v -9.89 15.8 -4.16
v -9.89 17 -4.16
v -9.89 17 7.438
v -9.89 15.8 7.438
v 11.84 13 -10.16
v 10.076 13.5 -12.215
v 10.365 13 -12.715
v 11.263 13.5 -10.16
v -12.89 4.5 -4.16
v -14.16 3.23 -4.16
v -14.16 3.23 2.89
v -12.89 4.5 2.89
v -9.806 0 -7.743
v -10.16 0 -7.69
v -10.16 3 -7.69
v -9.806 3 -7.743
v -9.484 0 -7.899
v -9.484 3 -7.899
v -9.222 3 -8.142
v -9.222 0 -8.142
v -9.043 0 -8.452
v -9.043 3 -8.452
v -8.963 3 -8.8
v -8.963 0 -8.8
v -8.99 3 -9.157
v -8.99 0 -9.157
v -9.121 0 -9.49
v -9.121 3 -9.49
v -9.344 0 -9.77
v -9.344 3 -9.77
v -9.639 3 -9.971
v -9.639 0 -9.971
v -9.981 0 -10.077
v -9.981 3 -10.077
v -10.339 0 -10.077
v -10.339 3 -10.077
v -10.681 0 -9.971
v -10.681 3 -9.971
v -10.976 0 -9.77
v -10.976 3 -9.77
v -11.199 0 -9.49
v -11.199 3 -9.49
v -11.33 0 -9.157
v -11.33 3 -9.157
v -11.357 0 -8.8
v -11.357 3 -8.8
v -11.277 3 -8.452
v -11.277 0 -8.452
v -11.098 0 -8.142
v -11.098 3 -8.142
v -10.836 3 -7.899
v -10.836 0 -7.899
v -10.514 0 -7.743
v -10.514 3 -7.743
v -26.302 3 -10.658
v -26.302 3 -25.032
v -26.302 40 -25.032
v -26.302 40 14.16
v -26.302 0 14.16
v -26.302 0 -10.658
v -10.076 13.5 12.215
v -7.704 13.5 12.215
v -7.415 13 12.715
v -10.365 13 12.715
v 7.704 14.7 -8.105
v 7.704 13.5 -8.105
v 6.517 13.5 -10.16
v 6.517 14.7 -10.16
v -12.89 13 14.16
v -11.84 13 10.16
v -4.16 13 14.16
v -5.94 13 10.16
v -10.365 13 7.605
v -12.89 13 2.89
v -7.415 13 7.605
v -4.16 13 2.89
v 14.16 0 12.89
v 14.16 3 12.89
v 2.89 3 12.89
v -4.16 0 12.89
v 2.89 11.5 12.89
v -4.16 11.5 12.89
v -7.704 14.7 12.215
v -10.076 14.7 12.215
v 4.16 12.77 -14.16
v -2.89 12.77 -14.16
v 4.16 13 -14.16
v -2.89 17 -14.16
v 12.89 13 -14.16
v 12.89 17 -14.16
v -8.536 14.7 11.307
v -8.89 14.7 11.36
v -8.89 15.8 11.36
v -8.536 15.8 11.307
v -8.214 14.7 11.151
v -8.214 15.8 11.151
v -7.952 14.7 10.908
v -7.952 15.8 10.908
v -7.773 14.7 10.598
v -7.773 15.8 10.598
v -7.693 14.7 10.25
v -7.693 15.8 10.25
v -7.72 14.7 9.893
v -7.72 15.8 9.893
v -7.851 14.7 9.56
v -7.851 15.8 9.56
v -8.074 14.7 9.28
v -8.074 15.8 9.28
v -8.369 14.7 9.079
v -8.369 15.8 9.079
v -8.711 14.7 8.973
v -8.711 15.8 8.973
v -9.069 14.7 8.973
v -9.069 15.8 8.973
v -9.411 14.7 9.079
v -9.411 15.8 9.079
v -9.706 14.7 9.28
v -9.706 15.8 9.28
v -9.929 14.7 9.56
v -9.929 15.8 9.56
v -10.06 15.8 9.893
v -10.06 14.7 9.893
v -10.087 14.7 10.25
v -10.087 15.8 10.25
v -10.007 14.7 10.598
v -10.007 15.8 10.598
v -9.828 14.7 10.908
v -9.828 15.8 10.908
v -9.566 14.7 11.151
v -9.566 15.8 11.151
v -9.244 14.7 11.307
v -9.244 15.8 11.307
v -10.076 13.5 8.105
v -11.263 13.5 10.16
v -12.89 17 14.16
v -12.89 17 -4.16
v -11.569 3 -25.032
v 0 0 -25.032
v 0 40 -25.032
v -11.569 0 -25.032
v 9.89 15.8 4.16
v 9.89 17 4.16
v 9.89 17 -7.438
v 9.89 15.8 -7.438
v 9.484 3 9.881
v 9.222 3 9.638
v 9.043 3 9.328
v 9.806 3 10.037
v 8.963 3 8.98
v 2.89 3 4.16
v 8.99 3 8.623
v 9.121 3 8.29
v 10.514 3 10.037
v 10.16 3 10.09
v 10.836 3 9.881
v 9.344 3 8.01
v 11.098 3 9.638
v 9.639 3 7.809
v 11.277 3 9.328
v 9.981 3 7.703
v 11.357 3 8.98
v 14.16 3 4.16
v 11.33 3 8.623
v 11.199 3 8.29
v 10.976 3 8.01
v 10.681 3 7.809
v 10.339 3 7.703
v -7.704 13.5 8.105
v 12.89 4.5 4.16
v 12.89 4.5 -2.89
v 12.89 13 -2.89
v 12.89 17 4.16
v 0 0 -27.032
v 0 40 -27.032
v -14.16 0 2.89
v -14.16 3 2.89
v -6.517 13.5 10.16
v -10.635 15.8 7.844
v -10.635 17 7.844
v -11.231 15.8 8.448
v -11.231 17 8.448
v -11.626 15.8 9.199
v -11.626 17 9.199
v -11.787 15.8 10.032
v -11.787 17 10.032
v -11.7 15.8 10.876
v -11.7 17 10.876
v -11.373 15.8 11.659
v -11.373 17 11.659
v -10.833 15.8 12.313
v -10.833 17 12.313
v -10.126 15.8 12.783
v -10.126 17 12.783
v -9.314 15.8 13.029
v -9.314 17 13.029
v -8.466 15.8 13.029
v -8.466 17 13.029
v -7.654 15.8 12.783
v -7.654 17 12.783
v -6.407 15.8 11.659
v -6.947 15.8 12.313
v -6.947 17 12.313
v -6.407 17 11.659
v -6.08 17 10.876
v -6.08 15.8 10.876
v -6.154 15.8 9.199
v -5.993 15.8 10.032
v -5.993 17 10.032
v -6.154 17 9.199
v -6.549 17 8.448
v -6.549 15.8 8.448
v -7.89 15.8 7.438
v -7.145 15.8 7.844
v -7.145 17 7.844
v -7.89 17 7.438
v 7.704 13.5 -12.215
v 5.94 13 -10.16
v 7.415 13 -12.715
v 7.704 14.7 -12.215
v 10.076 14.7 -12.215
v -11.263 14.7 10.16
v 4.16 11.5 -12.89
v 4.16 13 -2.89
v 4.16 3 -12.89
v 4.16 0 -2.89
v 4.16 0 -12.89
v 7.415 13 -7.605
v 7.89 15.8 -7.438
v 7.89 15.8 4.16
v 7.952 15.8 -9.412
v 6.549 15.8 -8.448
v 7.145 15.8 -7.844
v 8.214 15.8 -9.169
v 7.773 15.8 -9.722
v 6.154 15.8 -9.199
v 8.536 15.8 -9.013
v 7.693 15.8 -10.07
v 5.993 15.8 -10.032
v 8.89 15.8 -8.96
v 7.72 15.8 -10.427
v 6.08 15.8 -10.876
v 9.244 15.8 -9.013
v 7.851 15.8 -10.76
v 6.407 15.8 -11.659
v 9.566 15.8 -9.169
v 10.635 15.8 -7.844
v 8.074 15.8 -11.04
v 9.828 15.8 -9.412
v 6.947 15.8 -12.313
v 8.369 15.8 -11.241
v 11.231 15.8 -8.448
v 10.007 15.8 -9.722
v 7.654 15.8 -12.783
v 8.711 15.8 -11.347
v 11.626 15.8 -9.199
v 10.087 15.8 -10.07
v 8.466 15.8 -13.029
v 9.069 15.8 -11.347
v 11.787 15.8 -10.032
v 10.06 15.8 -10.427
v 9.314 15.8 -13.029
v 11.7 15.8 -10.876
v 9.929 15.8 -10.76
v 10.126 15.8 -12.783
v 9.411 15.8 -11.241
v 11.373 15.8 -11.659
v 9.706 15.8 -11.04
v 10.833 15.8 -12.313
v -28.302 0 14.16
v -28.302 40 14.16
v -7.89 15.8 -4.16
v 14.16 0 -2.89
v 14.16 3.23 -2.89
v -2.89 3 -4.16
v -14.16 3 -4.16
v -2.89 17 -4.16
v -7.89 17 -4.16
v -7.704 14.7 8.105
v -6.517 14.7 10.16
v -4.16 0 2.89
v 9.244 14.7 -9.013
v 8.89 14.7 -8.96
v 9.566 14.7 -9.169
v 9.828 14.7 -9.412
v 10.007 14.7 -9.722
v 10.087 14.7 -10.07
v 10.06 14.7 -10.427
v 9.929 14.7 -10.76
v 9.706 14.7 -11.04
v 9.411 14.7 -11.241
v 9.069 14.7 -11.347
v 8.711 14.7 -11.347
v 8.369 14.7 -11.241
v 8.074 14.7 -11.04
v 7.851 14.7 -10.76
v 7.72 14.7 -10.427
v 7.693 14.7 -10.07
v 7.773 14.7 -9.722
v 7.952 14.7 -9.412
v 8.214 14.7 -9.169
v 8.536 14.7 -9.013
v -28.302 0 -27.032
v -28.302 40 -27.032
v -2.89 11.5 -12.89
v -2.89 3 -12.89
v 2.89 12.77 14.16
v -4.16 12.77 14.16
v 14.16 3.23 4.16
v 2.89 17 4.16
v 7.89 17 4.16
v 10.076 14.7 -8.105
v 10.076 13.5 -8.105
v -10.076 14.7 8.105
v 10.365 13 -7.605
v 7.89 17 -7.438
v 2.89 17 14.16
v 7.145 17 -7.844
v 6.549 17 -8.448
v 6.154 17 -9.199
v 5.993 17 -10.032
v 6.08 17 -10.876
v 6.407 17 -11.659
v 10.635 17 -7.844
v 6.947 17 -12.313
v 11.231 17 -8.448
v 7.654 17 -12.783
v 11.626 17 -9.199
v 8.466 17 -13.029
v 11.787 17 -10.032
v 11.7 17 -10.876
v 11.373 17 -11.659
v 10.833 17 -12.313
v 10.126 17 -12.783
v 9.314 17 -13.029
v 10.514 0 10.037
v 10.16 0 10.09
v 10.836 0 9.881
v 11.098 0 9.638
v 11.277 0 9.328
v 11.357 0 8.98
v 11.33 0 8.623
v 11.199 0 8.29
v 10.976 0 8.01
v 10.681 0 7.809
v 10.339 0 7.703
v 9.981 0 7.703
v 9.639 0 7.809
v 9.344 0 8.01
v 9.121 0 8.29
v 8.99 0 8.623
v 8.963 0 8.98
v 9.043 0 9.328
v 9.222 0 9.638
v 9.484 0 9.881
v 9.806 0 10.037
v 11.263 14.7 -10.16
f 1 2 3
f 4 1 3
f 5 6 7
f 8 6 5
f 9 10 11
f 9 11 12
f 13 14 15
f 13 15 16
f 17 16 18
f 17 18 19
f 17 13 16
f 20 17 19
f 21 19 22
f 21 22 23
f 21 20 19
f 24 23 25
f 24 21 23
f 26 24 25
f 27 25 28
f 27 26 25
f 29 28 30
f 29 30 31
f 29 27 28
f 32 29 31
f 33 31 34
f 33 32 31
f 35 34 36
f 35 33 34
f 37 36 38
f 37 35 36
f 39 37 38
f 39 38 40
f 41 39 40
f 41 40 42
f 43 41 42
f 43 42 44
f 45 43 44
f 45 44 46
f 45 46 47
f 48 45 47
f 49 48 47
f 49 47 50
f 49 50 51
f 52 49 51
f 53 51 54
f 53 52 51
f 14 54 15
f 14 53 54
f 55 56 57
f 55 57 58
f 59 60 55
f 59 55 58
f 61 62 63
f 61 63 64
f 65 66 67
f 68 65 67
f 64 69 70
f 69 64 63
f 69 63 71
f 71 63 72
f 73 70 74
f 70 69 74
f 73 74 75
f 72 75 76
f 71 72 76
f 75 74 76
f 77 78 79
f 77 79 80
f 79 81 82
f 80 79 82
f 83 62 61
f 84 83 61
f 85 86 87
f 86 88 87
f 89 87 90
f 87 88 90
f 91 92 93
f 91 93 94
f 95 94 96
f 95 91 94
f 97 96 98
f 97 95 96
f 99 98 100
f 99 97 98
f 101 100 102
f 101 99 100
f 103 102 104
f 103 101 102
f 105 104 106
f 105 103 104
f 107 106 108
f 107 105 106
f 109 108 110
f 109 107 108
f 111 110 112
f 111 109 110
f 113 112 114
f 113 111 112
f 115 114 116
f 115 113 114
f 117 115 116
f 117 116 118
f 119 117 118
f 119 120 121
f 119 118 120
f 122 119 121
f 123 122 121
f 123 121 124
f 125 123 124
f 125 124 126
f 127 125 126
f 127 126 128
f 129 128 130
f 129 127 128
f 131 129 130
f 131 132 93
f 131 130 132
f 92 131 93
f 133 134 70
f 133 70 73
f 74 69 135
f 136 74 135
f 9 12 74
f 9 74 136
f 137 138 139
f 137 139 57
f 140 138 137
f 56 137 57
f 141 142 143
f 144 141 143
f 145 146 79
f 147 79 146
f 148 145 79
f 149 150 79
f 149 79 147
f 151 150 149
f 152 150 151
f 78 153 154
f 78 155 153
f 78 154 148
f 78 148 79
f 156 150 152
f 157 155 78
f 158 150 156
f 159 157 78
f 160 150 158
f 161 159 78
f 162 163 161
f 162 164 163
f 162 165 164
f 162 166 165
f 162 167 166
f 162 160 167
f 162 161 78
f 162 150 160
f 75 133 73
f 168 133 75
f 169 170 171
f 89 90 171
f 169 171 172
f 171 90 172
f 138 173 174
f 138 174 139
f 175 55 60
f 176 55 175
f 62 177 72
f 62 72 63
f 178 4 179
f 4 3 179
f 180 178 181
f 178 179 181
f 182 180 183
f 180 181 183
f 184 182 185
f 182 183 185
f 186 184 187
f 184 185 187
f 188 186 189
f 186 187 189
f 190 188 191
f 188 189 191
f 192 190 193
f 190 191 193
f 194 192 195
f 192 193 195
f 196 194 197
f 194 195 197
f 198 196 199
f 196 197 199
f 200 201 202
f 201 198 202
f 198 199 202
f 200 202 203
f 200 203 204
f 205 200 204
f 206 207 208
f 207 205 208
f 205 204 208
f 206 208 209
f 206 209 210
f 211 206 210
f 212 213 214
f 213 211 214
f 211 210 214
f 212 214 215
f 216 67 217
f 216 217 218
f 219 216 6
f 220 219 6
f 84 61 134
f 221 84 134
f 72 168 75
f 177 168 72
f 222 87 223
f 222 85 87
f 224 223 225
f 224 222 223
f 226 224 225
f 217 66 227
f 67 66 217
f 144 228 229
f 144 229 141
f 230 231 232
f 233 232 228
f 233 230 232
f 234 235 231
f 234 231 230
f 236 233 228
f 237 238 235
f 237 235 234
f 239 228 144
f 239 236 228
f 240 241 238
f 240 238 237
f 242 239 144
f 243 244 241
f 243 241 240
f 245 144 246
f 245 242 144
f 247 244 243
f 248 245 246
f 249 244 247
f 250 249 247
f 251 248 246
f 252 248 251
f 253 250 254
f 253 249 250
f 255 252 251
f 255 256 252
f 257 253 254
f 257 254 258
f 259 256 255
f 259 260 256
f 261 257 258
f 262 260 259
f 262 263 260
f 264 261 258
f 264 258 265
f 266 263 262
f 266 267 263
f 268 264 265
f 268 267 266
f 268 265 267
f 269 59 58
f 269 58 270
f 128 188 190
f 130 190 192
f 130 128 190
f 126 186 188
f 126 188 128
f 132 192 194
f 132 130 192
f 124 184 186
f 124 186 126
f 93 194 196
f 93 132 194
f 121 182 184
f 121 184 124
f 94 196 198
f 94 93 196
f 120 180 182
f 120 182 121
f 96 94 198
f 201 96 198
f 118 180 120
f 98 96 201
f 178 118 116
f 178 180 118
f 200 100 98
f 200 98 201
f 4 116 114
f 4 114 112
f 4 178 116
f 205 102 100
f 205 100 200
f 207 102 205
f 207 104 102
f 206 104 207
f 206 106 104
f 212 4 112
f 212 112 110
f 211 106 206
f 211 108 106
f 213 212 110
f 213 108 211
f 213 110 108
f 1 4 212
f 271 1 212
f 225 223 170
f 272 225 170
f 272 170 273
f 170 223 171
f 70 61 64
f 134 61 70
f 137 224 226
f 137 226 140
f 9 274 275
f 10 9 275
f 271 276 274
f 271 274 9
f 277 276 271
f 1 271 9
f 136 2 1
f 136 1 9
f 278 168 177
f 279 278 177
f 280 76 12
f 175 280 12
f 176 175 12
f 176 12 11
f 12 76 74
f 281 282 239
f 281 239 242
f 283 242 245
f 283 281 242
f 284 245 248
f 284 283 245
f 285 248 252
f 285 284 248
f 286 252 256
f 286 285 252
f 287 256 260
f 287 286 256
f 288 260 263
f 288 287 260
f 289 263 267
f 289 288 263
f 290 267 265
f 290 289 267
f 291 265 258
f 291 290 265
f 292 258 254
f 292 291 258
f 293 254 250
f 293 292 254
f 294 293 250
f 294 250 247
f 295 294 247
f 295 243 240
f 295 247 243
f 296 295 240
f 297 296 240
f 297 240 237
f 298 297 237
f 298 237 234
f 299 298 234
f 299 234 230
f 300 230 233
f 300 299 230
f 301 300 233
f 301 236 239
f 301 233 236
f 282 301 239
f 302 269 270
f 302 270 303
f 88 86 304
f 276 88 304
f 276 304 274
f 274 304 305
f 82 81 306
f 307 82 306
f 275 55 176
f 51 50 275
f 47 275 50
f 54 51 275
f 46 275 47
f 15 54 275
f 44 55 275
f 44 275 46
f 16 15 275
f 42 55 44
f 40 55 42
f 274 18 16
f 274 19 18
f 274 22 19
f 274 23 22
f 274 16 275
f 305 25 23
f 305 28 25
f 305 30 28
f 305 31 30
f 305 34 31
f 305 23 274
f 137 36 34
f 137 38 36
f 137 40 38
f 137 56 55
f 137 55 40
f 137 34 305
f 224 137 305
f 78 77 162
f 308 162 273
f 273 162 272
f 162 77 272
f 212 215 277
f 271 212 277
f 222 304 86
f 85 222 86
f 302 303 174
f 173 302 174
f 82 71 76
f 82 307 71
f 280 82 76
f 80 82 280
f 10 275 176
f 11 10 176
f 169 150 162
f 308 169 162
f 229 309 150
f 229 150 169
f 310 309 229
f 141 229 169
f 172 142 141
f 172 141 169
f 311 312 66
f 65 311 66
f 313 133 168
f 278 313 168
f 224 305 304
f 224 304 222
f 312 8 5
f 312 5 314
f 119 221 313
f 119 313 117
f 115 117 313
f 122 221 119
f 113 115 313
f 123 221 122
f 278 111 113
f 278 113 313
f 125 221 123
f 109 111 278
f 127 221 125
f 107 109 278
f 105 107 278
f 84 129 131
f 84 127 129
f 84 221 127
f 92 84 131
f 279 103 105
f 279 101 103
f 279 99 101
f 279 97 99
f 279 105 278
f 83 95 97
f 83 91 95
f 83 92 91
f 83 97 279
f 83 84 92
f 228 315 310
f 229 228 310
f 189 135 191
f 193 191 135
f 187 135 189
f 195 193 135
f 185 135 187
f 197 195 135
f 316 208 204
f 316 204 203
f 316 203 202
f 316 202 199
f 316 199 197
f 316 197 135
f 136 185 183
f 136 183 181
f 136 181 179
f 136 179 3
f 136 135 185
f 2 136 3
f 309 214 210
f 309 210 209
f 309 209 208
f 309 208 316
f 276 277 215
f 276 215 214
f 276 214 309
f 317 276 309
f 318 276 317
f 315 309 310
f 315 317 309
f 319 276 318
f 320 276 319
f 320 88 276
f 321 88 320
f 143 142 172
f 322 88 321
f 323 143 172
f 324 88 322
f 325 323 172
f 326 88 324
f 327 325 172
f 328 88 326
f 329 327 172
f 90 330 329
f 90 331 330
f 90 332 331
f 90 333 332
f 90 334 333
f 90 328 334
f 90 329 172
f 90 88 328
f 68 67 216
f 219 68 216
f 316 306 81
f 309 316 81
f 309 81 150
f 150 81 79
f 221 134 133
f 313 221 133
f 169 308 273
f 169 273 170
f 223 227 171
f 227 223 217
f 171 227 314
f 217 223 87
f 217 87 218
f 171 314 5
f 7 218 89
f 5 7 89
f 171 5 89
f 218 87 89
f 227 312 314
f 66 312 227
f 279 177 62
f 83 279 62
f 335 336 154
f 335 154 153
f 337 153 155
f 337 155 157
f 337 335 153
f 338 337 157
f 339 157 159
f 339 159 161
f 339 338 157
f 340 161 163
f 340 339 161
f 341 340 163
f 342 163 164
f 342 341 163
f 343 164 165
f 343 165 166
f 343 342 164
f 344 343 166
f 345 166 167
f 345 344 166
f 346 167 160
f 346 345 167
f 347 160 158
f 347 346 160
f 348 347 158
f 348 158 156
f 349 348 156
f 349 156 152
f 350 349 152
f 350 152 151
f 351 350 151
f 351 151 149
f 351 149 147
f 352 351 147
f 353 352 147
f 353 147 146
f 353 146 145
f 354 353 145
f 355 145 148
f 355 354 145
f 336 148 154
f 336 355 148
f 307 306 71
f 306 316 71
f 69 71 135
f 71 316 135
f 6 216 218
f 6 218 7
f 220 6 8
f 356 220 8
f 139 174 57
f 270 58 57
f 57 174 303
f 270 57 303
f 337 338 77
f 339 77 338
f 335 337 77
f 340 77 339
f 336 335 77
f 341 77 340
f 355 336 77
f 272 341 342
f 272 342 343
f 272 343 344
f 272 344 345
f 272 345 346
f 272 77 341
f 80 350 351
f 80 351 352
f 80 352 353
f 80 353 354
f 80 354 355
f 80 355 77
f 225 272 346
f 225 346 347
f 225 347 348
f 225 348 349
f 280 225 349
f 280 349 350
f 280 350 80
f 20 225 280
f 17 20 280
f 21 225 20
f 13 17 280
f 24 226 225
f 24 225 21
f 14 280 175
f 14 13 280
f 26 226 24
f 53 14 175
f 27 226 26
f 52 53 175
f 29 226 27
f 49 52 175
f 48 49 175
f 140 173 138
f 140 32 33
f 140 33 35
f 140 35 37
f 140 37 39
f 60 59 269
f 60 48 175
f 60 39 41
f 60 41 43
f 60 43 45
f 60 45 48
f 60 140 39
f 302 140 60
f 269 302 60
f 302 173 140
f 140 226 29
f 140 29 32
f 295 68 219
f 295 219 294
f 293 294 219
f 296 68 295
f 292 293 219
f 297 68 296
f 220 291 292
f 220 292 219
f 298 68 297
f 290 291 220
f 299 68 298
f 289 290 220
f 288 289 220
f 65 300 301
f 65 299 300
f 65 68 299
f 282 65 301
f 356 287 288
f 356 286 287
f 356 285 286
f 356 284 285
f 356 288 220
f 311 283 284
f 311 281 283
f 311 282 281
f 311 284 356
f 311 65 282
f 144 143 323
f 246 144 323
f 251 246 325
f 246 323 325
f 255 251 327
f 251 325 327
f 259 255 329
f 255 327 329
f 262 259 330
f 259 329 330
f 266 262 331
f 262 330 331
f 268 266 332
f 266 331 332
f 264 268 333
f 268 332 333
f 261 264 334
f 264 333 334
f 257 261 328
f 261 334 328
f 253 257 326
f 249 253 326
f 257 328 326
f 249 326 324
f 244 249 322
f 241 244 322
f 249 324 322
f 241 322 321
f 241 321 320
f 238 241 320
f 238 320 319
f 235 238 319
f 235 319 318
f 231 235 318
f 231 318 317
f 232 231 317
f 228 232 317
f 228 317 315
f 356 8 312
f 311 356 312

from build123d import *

# Parameters (mm, degrees)
SKETCH1_W           = 28.32
SKETCH1_H           = 25.78
SKETCH1_R           = 1.2
BOSS_EXTRUDE1_DEPTH = 3
SKETCH4_W           = 25.78
SKETCH4_H           = 28.32
SKETCH4_R           = 1.2
BOSS_EXTRUDE2_DEPTH = 4
SKETCH5_W           = 10
SKETCH5_H           = 10
CUT_EXTRUDE2_DEPTH  = 4
SKETCH8_W           = 10
SKETCH8_H           = 10
CUT_EXTRUDE3_DEPTH  = 3
BOSS_EXTRUDE3_DEPTH = 10
SKETCH3_R           = 2.9
CUT_EXTRUDE4_DEPTH  = 1.2
CHAMFER1_SIZE       = 1.5
BOSS_EXTRUDE4_DEPTH = 3
EXTRUDE_THIN1_START = -3
EXTRUDE_THIN1_DEPTH = 40
CUT_EXTRUDE5_DEPTH  = 1.7
CHAMFER2_SIZE       = 0.5
CUT_EXTRUDE6_DEPTH  = 1.2


with BuildPart() as part:
    # Sketch1 → Boss-Extrude1 (new body)
    with BuildSketch(Plane(origin=(0, 0, 0), x_dir=(1, 0, 0), z_dir=(0, 1, 0))):
        Rectangle(SKETCH1_W, SKETCH1_H)
        with Locations(Location((-10.16, 8.89, 0), (0, 0, 270))):
            Circle(SKETCH1_R, mode=Mode.SUBTRACT)
        with Locations(Location((10.16, 8.89, 0), (0, 0, 270))):
            Circle(SKETCH1_R, mode=Mode.SUBTRACT)
        with Locations(Location((10.16, -8.89, 0), (0, 0, 270))):
            Circle(SKETCH1_R, mode=Mode.SUBTRACT)
        with Locations(Location((-10.16, -8.89, 0), (0, 0, 270))):
            Circle(SKETCH1_R, mode=Mode.SUBTRACT)
    extrude(amount=BOSS_EXTRUDE1_DEPTH)

    # Sketch8 → Cut-Extrude3 (cut)
    with BuildSketch(Plane.XZ):
        with Locations((-9.16, 7.89)):
            Rectangle(SKETCH8_W, SKETCH8_H)
        with Locations((9.16, -7.89)):
            Rectangle(SKETCH8_W, SKETCH8_H)
    extrude(amount=-CUT_EXTRUDE3_DEPTH, mode=Mode.SUBTRACT)



with BuildPart() as body_2:
    # Sketch4 → Boss-Extrude2 (new body)
    with BuildSketch(Plane(origin=(0, 13, 0), x_dir=(1, 0, 0), z_dir=(0, 1, 0))):
        Rectangle(SKETCH4_W, SKETCH4_H)
        with Locations(Location((-8.89, 10.16, 0), (0, 0, 270))):
            Circle(SKETCH4_R, mode=Mode.SUBTRACT)
        with Locations(Location((8.89, 10.16, 0), (0, 0, 270))):
            Circle(SKETCH4_R, mode=Mode.SUBTRACT)
        with Locations(Location((-8.89, -10.16, 0), (0, 0, 270))):
            Circle(SKETCH4_R, mode=Mode.SUBTRACT)
        with Locations(Location((8.89, -10.16, 0), (0, 0, 270))):
            Circle(SKETCH4_R, mode=Mode.SUBTRACT)
    extrude(amount=BOSS_EXTRUDE2_DEPTH)

    # Sketch5 → Cut-Extrude2 (cut)
    with BuildSketch(Plane(origin=(0, 17, 0), x_dir=(1, 0, 0), z_dir=(0, 1, 0))):
        with Locations((-7.89, 9.16)):
            Rectangle(SKETCH5_W, SKETCH5_H)
        with Locations((7.89, -9.16)):
            Rectangle(SKETCH5_W, SKETCH5_H)
    extrude(amount=-CUT_EXTRUDE2_DEPTH, mode=Mode.SUBTRACT)


with BuildPart() as part_1:
    add(part.part)

    add(body_2.part)  # Boss-Extrude3 merges body 2
    # Sketch9 → Boss-Extrude3 (add)
    with BuildSketch(Plane.XZ.offset(-13)):
        Polygon((2.89, 4.16), (2.89, 12.89), (-4.16, 12.89), (-4.16, 2.89), (-12.89, 2.89), (-12.89, -4.16), (-2.89, -4.16), (-2.89, -12.89), (4.16, -12.89), (4.16, -2.89), (12.89, -2.89), (12.89, 4.16), align=None)
    extrude(amount=BOSS_EXTRUDE3_DEPTH)

    # Sketch3 → Cut-Extrude4 (cut)
    with BuildSketch(Plane(origin=(0, 17, 0), x_dir=(1, 0, 0), z_dir=(0, 1, 0))):
        with Locations(Location((8.89, 10.16, 0), (0, 0, 270))):
            Circle(SKETCH3_R)
        with Locations(Location((-8.89, -10.16, 0), (0, 0, 270))):
            Circle(SKETCH3_R)
    extrude(amount=-CUT_EXTRUDE4_DEPTH, mode=Mode.SUBTRACT)

    # Chamfer1
    # the kernel refuses this chamfer: 1.5 mm, written as the material it adds along each edge
    with BuildSketch(Plane(origin=(-2.89, 13, -12.89), x_dir=(0, -0.9996219169112968, 0.027495876610585616), z_dir=(1, 0, 0))) as chamfer1_piece_1_section:
        Polygon((CHAMFER1_SIZE * 0.999621916911, CHAMFER1_SIZE * 0.0274958766106), (-CHAMFER1_SIZE * 0.0274958766106, CHAMFER1_SIZE * 0.999621916911), (0, 0), align=None)
    chamfer1_piece_1 = extrude(amount=7.05, mode=Mode.PRIVATE)
    chamfer1_piece_1 = split(chamfer1_piece_1, bisect_by=Plane(origin=(0.635, 12.489006397, -14.16), z_dir=(0, 0, 1)), keep=Keep.TOP, mode=Mode.PRIVATE)
    add(chamfer1_piece_1)
    with BuildSketch(Plane(origin=(2.89, 13, 12.89), x_dir=(0, -0.9996219169112965, -0.02749587661058676), z_dir=(-1, 0, 0))) as chamfer1_piece_2_section:
        Polygon((CHAMFER1_SIZE * 0.999621916911, CHAMFER1_SIZE * 0.0274958766106), (-CHAMFER1_SIZE * 0.0274958766106, CHAMFER1_SIZE * 0.999621916911), (0, 0), align=None)
    chamfer1_piece_2 = extrude(amount=7.05, mode=Mode.PRIVATE)
    chamfer1_piece_2 = split(chamfer1_piece_2, bisect_by=Plane(origin=(-0.635, 12.489006397, 14.16), z_dir=(0, 0, -1)), keep=Keep.TOP, mode=Mode.PRIVATE)
    add(chamfer1_piece_2)
    with BuildSketch(Plane(origin=(12.89, 3, -2.89), x_dir=(0.9996219169112965, -0.027495876610587625, 0), z_dir=(0, 0, 1))) as chamfer1_piece_3_section:
        Polygon((CHAMFER1_SIZE * 0.999621916911, CHAMFER1_SIZE * 0.0274958766106), (-CHAMFER1_SIZE * 0.0274958766106, CHAMFER1_SIZE * 0.999621916911), (0, 0), align=None)
    chamfer1_piece_3 = extrude(amount=7.05, mode=Mode.PRIVATE)
    chamfer1_piece_3 = split(chamfer1_piece_3, bisect_by=Plane(origin=(14.16, 3.510993603, 0.635), z_dir=(-1, 0, 0)), keep=Keep.TOP, mode=Mode.PRIVATE)
    add(chamfer1_piece_3)
    with BuildSketch(Plane(origin=(-12.89, 3, 2.89), x_dir=(-0.9996219169112965, -0.027495876610587625, 0), z_dir=(0, 0, -1))) as chamfer1_piece_4_section:
        Polygon((CHAMFER1_SIZE * 0.999621916911, CHAMFER1_SIZE * 0.0274958766106), (-CHAMFER1_SIZE * 0.0274958766106, CHAMFER1_SIZE * 0.999621916911), (0, 0), align=None)
    chamfer1_piece_4 = extrude(amount=7.05, mode=Mode.PRIVATE)
    chamfer1_piece_4 = split(chamfer1_piece_4, bisect_by=Plane(origin=(-14.16, 3.510993603, -0.635), z_dir=(1, 0, 0)), keep=Keep.TOP, mode=Mode.PRIVATE)
    add(chamfer1_piece_4)

    # Sketch10 → Boss-Extrude4 (add)
    with BuildSketch(Plane(origin=(0, 3, 0), x_dir=(1, 0, 0), z_dir=(0, 1, 0))):
        Polygon((-28.302135624, 12.89), (-14.16, -2.89), (-14.16, 12.89), (4.16, 12.89), (-14.16, 27.032135624), (-28.302135624, 27.032135624), align=None)
    extrude(amount=-BOSS_EXTRUDE4_DEPTH)

    # Sketch11 → Extrude-Thin1 (add)
    with BuildSketch(Plane(origin=(0, 3, 0), x_dir=(1, 0, 0), z_dir=(0, 1, 0)).offset(EXTRUDE_THIN1_START)):
        Polygon((-28.302135624, -14.16), (-28.302135624, 27.032135624), (0, 27.032135624), (0, 25.032135624), (-26.302135624, 25.032135624), (-26.302135624, -14.16), align=None)
    extrude(amount=EXTRUDE_THIN1_DEPTH)

    # Sketch12 → Cut-Extrude5 (cut)
    with BuildSketch(Plane.XZ.offset(-13)):
        Polygon((-10.076454803, 12.215), (-11.262909606, 10.16), (-10.076454803, 8.105), (-7.703545197, 8.105), (-6.517090394, 10.16), (-7.703545197, 12.215), align=None)
        Polygon((10.076454803, -12.215), (11.262909606, -10.16), (10.076454803, -8.105), (7.703545197, -8.105), (6.517090394, -10.16), (7.703545197, -12.215), align=None)
    extrude(amount=-CUT_EXTRUDE5_DEPTH, mode=Mode.SUBTRACT)

    # Chamfer2
    chamfer2_edges = [part_1.edges().sort_by_distance(p)[0] for p in [
        (-8.89, 13, 12.215),
        (-10.669682205, 13, 11.1875),
        (-10.669682205, 13, 9.1325),
        (-8.89, 13, 8.105),
        (-7.110317795, 13, 9.1325),
        (-7.110317795, 13, 11.1875),
        (8.89, 13, -12.215),
        (10.669682205, 13, -11.1875),
        (10.669682205, 13, -9.1325),
        (8.89, 13, -8.105),
        (7.110317795, 13, -9.1325),
        (7.110317795, 13, -11.1875),
    ]]
    chamfer(chamfer2_edges, length=CHAMFER2_SIZE)

    # Sketch13 → Cut-Extrude6 (cut)
    with BuildSketch(Plane(origin=(0, 17, 0), x_dir=(1, 0, 0), z_dir=(0, 1, 0))):
        with BuildLine():
            Line((-9.89, 4.16), (-9.89, -7.437868482))
            ThreePointArc((-9.89, -7.437868482), (-8.89, -7.26), (-7.89, -7.437868482))
            Line((-7.89, -7.437868482), (-7.89, 4.16))
            Line((-7.89, 4.16), (-9.89, 4.16))
        make_face()
        with BuildLine():
            ThreePointArc((9.89, 7.437868482), (8.89, 7.26), (7.89, 7.437868482))
            Line((7.89, 7.437868482), (7.89, -4.16))
            Line((7.89, -4.16), (9.89, -4.16))
            Line((9.89, -4.16), (9.89, 7.437868482))
        make_face()
    extrude(amount=-CUT_EXTRUDE6_DEPTH, mode=Mode.SUBTRACT)


solid = part_1.part
